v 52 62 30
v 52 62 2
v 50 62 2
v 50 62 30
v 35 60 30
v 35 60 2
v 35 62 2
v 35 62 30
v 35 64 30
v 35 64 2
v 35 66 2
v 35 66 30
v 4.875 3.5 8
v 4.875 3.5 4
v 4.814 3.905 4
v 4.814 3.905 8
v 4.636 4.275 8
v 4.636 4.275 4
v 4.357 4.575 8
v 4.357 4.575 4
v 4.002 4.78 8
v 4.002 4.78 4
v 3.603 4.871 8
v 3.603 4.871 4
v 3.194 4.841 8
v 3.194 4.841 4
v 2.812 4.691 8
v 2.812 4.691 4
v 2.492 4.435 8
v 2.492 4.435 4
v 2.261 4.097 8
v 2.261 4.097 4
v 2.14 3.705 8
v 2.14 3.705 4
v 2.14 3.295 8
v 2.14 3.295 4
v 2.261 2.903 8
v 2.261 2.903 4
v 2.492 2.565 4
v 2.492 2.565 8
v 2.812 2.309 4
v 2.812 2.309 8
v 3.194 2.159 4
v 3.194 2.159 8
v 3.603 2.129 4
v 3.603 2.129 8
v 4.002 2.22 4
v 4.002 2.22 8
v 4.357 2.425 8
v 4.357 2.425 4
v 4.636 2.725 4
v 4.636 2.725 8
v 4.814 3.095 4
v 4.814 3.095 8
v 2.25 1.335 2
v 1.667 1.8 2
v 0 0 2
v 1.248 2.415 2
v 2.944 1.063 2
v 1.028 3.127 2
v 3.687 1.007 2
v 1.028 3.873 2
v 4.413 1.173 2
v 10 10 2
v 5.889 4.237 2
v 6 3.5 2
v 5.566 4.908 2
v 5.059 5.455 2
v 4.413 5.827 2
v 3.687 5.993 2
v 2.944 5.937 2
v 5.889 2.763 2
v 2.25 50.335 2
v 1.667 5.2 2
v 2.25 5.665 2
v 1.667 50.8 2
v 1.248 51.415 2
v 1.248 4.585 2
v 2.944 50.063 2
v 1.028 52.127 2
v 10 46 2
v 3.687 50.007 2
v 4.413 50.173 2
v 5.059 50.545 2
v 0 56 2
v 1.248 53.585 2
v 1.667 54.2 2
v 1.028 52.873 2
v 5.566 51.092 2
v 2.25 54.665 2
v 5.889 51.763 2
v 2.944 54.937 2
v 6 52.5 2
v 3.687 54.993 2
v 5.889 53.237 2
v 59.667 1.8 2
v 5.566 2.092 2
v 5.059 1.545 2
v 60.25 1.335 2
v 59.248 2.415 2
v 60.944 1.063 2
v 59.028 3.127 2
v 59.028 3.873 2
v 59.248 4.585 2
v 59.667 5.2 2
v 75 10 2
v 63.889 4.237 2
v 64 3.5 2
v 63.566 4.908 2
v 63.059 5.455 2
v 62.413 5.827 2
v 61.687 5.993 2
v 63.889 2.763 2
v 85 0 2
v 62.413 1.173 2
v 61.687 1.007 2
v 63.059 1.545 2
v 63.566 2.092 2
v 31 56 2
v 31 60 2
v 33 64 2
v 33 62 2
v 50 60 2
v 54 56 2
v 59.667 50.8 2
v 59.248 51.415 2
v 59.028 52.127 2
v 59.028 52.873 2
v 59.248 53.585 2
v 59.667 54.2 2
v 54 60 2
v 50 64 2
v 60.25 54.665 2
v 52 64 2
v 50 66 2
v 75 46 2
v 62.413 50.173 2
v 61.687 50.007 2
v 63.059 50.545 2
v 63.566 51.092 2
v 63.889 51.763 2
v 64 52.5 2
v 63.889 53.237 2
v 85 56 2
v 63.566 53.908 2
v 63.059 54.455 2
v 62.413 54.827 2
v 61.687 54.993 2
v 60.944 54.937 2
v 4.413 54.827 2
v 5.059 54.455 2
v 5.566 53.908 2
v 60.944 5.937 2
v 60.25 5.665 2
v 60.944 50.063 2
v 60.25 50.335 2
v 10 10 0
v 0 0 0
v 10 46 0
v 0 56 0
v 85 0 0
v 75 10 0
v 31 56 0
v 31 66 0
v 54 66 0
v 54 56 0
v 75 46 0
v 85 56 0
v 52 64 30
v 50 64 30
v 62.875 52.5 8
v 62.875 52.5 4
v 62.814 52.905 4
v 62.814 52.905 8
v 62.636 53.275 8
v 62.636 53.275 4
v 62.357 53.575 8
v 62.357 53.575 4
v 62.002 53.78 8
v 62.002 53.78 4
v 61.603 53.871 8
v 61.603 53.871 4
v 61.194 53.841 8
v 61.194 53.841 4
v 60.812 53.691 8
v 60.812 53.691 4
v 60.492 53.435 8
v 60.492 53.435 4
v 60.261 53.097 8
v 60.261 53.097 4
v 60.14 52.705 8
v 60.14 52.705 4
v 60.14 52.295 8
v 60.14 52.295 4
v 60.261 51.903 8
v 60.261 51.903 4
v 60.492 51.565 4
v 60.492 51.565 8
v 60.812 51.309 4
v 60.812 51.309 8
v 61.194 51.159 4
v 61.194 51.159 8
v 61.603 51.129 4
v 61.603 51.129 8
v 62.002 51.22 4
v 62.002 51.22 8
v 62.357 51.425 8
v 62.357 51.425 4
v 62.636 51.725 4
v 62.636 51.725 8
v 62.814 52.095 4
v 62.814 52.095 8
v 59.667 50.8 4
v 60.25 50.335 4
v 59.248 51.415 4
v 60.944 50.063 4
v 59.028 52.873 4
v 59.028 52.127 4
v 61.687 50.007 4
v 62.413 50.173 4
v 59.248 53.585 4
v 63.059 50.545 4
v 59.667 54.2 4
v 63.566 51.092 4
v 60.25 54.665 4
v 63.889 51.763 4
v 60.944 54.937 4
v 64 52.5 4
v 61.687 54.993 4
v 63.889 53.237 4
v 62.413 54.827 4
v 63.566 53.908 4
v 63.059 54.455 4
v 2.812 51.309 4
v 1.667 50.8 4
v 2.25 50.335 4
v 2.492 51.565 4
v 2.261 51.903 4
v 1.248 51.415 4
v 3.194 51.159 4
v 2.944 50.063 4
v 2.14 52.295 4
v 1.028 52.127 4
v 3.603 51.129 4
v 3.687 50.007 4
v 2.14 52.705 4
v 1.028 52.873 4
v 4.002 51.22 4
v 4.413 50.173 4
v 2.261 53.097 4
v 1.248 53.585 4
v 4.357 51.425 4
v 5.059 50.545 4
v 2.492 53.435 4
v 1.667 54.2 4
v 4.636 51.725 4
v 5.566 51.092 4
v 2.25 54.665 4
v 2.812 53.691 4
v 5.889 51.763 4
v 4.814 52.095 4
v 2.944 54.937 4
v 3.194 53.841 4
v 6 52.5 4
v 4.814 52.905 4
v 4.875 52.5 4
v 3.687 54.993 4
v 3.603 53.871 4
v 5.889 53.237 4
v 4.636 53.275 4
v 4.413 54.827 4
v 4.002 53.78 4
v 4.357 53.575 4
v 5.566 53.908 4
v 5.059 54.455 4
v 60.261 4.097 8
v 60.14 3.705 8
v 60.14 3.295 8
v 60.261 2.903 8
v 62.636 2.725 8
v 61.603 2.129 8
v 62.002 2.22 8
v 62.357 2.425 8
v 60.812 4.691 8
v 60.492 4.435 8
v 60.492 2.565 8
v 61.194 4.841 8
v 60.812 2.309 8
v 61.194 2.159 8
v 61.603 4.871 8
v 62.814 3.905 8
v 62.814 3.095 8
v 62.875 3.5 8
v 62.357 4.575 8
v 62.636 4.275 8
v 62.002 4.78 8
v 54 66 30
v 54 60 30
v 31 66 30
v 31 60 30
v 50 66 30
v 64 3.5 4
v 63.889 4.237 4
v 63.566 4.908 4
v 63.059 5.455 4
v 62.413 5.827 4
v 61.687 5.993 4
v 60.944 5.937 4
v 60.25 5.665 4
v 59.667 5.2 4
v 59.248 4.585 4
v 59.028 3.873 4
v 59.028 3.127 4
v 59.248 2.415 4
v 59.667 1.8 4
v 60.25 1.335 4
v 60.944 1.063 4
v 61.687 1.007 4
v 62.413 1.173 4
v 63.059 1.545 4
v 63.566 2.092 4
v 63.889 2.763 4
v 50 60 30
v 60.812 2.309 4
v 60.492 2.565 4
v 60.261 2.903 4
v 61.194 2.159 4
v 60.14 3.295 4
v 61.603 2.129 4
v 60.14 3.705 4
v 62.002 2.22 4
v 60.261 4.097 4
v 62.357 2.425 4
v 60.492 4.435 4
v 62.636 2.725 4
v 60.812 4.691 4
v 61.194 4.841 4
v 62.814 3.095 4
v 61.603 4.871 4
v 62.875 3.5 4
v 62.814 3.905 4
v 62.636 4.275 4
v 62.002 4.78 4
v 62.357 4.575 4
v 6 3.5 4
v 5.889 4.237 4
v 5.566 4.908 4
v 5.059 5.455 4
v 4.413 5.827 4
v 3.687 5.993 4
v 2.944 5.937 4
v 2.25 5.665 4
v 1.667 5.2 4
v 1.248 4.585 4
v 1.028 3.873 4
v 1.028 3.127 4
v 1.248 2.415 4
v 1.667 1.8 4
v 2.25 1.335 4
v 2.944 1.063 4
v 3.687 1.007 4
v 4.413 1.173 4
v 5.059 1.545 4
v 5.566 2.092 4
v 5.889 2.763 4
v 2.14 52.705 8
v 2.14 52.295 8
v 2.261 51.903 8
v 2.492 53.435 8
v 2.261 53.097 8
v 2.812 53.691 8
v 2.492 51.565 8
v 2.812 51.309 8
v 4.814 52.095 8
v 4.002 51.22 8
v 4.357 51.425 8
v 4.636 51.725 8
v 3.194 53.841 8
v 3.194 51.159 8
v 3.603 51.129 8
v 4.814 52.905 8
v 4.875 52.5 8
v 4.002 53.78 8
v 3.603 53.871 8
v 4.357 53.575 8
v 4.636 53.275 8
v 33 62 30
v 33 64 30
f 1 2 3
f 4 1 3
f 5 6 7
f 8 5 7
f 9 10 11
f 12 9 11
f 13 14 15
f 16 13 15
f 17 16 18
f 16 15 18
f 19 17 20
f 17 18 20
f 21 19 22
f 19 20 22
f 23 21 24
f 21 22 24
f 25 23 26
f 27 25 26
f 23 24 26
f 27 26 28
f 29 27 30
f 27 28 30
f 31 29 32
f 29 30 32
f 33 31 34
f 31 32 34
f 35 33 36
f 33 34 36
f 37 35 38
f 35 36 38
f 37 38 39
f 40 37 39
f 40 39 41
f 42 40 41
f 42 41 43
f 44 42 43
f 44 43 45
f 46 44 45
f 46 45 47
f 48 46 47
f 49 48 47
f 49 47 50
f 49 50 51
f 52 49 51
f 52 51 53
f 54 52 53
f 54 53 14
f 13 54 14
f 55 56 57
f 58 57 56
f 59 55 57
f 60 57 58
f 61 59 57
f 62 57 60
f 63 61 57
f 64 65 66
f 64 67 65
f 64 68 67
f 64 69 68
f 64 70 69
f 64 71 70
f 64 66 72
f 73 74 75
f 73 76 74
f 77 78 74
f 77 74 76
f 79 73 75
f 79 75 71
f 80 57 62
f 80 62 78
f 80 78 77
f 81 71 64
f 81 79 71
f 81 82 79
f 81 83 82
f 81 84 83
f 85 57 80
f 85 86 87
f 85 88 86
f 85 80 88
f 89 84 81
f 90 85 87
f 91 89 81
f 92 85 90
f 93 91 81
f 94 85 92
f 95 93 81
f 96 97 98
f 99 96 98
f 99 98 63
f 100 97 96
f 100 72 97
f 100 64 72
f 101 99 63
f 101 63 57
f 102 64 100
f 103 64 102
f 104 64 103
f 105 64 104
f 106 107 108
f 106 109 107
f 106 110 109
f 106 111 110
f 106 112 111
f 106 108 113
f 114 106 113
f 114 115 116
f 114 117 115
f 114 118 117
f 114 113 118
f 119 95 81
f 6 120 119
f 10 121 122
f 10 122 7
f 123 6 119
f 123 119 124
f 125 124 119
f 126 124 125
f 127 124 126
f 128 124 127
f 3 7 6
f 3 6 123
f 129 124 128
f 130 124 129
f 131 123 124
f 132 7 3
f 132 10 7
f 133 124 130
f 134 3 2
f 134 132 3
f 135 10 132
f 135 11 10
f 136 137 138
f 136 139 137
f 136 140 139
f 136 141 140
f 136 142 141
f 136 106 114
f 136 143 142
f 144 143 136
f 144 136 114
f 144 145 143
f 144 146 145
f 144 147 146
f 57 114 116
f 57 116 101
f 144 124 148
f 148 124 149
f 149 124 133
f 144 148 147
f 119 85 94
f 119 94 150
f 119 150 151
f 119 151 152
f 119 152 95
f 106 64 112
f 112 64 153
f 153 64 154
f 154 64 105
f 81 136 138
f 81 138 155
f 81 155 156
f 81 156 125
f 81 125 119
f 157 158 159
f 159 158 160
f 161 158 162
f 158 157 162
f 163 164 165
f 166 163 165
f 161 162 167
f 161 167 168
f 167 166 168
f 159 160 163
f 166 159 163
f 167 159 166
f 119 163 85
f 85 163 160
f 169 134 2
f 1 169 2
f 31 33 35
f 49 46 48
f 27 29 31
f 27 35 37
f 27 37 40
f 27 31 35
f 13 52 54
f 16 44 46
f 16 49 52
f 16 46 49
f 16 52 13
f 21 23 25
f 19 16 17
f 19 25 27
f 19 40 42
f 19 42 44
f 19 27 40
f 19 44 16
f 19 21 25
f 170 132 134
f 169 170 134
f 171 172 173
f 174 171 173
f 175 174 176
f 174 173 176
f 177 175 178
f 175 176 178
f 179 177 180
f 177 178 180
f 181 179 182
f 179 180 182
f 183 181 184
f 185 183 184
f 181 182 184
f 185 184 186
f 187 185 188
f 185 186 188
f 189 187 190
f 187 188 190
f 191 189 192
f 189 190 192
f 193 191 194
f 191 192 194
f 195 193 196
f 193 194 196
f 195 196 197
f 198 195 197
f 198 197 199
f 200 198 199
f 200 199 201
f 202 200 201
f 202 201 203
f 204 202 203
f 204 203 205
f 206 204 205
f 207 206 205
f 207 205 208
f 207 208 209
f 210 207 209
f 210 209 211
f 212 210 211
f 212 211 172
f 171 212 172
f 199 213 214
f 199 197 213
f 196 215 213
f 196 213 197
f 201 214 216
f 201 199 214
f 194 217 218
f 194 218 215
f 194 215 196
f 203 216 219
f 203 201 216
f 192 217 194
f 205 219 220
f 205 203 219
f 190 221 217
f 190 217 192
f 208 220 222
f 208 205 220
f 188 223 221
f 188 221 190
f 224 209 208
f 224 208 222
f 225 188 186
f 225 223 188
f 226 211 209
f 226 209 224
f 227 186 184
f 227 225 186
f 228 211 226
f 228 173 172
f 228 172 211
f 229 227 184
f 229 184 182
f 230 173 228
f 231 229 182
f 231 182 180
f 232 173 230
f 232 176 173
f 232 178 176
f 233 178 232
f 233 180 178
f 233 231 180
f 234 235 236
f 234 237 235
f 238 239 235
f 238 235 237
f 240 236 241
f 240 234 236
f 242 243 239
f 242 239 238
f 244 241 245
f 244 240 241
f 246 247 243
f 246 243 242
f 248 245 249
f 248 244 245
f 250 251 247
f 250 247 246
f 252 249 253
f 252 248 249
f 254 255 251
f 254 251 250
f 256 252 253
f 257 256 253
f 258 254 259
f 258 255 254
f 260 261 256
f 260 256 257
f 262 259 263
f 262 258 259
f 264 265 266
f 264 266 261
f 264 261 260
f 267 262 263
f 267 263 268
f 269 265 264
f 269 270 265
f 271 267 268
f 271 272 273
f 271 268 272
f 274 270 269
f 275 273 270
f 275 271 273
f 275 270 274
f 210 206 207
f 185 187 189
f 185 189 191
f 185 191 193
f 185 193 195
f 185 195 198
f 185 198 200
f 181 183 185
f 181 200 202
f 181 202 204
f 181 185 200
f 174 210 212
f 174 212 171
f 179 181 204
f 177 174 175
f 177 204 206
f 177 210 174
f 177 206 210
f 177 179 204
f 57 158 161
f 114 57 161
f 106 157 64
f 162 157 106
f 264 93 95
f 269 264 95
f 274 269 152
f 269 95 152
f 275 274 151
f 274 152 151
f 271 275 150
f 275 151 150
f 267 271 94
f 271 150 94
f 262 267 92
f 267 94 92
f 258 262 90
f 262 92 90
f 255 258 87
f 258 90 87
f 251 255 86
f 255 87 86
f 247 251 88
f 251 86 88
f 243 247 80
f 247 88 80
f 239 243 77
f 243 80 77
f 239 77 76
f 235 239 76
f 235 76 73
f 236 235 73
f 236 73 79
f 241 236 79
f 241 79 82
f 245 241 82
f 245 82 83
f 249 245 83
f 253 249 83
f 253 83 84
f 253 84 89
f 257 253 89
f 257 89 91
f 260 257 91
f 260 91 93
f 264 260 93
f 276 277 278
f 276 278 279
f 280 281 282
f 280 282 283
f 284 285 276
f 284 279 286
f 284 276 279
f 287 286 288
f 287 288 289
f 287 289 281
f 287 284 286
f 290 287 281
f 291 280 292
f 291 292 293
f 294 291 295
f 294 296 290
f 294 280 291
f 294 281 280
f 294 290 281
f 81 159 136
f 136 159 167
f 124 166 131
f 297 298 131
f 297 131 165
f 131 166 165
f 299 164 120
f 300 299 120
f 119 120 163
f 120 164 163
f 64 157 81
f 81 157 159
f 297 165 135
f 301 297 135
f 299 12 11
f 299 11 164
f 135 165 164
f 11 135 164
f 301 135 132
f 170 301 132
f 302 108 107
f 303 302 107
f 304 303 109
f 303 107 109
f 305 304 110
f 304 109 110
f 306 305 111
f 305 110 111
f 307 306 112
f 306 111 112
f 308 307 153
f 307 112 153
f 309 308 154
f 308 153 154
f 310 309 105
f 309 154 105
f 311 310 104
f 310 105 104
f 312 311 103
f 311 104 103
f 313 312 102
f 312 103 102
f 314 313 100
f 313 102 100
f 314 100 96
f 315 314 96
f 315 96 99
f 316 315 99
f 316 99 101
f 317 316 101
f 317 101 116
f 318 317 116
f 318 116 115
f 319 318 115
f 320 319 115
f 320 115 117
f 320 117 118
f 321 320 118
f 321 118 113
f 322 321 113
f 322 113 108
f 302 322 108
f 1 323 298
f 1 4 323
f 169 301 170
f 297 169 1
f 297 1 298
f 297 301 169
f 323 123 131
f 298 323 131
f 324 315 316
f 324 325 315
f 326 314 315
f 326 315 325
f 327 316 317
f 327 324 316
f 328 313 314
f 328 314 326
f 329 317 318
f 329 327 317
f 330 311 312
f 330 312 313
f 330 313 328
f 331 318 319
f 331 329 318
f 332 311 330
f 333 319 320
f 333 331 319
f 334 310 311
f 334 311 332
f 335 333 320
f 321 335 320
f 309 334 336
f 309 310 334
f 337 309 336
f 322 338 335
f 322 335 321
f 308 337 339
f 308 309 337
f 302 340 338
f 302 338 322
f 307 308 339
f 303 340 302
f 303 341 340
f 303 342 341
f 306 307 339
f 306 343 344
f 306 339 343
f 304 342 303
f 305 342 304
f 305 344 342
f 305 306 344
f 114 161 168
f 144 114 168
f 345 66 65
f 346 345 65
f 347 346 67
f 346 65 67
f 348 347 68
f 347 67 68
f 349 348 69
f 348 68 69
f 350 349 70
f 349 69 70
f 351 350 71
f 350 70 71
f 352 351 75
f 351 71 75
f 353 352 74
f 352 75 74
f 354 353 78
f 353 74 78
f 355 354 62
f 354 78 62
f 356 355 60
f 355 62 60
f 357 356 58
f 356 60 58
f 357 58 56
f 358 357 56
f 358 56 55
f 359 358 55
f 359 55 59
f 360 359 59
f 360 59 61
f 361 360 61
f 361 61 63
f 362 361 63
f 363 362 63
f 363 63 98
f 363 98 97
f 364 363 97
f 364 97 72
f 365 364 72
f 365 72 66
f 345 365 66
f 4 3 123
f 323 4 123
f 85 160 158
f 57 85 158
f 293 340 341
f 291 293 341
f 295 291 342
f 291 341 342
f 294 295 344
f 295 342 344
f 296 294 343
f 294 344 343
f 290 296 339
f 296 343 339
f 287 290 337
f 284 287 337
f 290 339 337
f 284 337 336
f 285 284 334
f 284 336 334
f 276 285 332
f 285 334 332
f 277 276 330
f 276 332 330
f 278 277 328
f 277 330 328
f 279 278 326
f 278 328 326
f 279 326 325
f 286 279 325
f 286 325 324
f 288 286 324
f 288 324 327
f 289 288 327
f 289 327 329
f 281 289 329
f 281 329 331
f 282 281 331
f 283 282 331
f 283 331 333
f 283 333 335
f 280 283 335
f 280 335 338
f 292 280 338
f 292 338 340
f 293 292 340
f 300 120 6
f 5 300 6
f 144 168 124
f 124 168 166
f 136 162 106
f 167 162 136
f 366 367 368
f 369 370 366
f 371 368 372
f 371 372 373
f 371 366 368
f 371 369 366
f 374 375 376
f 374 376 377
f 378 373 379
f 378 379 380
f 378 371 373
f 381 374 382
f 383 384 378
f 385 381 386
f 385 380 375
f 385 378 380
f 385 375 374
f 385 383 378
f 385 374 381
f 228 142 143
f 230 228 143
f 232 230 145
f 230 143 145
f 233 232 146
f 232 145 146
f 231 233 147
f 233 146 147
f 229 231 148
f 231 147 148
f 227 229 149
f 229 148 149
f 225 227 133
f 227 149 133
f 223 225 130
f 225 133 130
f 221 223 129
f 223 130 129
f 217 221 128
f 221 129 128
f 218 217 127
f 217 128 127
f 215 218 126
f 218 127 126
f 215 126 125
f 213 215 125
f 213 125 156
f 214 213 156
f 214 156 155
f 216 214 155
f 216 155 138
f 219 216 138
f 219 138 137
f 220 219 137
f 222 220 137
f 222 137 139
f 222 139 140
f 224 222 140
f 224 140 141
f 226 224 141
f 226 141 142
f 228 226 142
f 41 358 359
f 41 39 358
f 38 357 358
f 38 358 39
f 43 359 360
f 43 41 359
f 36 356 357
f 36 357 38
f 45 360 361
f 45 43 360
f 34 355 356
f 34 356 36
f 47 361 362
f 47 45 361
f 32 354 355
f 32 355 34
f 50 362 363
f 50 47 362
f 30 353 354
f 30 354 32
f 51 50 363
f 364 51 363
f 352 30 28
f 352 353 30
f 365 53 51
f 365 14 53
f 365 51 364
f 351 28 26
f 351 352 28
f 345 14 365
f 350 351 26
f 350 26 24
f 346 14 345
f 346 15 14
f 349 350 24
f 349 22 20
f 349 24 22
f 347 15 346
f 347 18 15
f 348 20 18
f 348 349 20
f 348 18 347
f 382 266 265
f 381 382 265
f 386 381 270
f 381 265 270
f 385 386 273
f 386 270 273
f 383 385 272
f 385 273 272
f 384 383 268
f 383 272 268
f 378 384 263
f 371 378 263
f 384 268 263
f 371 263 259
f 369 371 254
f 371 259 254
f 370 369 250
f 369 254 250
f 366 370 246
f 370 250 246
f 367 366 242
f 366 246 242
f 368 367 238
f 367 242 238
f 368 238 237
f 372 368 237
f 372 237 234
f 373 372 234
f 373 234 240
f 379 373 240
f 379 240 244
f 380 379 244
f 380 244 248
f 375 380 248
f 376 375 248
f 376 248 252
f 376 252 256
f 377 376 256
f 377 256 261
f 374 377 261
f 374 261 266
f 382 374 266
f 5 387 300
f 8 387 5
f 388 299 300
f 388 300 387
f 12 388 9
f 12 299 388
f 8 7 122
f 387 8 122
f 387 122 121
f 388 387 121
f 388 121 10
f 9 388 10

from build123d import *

# Parameters (mm, degrees)
F1_DEPTH = 30
F0_R     = 2.5
F0_R_2   = 1.375
F2_DEPTH = 4
F3_DEPTH = 8
F0_W     = 65
F0_H     = 36
F4_DEPTH = 2


with BuildPart() as f1:
    # F0 (on Top) → F1 (new body)
    with BuildSketch(Plane.XY):
        Polygon((31, 66), (31, 60), (35, 60), (35, 62), (33, 62), (33, 64), (35, 64), (35, 66), align=None)
    extrude(amount=F1_DEPTH)



with BuildPart() as f1b:
    # F0 (on Top) → F1, piece 2 (new body)
    with BuildSketch(Plane.XY):
        Polygon((50, 60), (54, 60), (54, 66), (50, 66), (50, 64), (52, 64), (52, 62), (50, 62), align=None)
    extrude(amount=F1_DEPTH)


with BuildPart() as f2:
    # F0 (on Top) → F2 (new body)
    with BuildSketch(Plane.XY):
        with Locations((3.5, 52.5)):
            Circle(F0_R)
        with Locations((3.5, 52.5)):
            Circle(F0_R_2, mode=Mode.SUBTRACT)
    extrude(amount=F2_DEPTH)

    # F0 (on Top) → F3 (join)
    with BuildSketch(Plane.XY):
        with Locations((3.5, 52.5)):
            Circle(F0_R_2)
    extrude(amount=F3_DEPTH)


with BuildPart() as f2b:
    # F0 (on Top) → F2, piece 2 (new body)
    with BuildSketch(Plane.XY):
        with Locations((61.5, 52.5)):
            Circle(F0_R)
        with Locations((61.5, 52.5)):
            Circle(F0_R_2, mode=Mode.SUBTRACT)
    extrude(amount=F2_DEPTH)

    # F0 (on Top) → F3, piece 2 (join)
    with BuildSketch(Plane.XY):
        with Locations((61.5, 52.5)):
            Circle(F0_R_2)
    extrude(amount=F3_DEPTH)


with BuildPart() as f2c:
    # F0 (on Top) → F2, piece 3 (new body)
    with BuildSketch(Plane.XY):
        with Locations((61.5, 3.5)):
            Circle(F0_R)
        with Locations((61.5, 3.5)):
            Circle(F0_R_2, mode=Mode.SUBTRACT)
    extrude(amount=F2_DEPTH)

    # F0 (on Top) → F3, piece 3 (join)
    with BuildSketch(Plane.XY):
        with Locations((61.5, 3.5)):
            Circle(F0_R_2)
    extrude(amount=F3_DEPTH)


with BuildPart() as f2d:
    # F0 (on Top) → F2, piece 4 (new body)
    with BuildSketch(Plane.XY):
        with Locations((3.5, 3.5)):
            Circle(F0_R)
        with Locations((3.5, 3.5)):
            Circle(F0_R_2, mode=Mode.SUBTRACT)
    extrude(amount=F2_DEPTH)

    # F0 (on Top) → F3, piece 4 (join)
    with BuildSketch(Plane.XY):
        with Locations((3.5, 3.5)):
            Circle(F0_R_2)
    extrude(amount=F3_DEPTH)


with BuildPart() as f1_1:
    add(f1.part)

    add(f1b.part)  # F4 merges F1b

    add(f2.part)  # F4 merges F2

    add(f2b.part)  # F4 merges F2b

    add(f2c.part)  # F4 merges F2c

    add(f2d.part)  # F4 merges F2d
    # F0 (on Top) → F4 (join)
    with BuildSketch(Plane.XY):
        Polygon((0, 28), (0, 0), (85, 0), (85, 28), (85, 56), (54, 56), (54, 60), (50, 60), (50, 62), (52, 62), (52, 64), (50, 64), (50, 66), (35, 66), (35, 64), (33, 64), (33, 62), (35, 62), (35, 60), (31, 60), (31, 56), (0, 56), align=None)
        with Locations((3.5, 3.5)):
            Circle(F0_R, mode=Mode.SUBTRACT)
        with Locations((61.5, 3.5)):
            Circle(F0_R, mode=Mode.SUBTRACT)
        with Locations((42.5, 28)):
            Rectangle(F0_W, F0_H, mode=Mode.SUBTRACT)
        with Locations((3.5, 52.5)):
            Circle(F0_R, mode=Mode.SUBTRACT)
        with Locations((61.5, 52.5)):
            Circle(F0_R, mode=Mode.SUBTRACT)
    extrude(amount=F4_DEPTH)


solid = f1_1.part
